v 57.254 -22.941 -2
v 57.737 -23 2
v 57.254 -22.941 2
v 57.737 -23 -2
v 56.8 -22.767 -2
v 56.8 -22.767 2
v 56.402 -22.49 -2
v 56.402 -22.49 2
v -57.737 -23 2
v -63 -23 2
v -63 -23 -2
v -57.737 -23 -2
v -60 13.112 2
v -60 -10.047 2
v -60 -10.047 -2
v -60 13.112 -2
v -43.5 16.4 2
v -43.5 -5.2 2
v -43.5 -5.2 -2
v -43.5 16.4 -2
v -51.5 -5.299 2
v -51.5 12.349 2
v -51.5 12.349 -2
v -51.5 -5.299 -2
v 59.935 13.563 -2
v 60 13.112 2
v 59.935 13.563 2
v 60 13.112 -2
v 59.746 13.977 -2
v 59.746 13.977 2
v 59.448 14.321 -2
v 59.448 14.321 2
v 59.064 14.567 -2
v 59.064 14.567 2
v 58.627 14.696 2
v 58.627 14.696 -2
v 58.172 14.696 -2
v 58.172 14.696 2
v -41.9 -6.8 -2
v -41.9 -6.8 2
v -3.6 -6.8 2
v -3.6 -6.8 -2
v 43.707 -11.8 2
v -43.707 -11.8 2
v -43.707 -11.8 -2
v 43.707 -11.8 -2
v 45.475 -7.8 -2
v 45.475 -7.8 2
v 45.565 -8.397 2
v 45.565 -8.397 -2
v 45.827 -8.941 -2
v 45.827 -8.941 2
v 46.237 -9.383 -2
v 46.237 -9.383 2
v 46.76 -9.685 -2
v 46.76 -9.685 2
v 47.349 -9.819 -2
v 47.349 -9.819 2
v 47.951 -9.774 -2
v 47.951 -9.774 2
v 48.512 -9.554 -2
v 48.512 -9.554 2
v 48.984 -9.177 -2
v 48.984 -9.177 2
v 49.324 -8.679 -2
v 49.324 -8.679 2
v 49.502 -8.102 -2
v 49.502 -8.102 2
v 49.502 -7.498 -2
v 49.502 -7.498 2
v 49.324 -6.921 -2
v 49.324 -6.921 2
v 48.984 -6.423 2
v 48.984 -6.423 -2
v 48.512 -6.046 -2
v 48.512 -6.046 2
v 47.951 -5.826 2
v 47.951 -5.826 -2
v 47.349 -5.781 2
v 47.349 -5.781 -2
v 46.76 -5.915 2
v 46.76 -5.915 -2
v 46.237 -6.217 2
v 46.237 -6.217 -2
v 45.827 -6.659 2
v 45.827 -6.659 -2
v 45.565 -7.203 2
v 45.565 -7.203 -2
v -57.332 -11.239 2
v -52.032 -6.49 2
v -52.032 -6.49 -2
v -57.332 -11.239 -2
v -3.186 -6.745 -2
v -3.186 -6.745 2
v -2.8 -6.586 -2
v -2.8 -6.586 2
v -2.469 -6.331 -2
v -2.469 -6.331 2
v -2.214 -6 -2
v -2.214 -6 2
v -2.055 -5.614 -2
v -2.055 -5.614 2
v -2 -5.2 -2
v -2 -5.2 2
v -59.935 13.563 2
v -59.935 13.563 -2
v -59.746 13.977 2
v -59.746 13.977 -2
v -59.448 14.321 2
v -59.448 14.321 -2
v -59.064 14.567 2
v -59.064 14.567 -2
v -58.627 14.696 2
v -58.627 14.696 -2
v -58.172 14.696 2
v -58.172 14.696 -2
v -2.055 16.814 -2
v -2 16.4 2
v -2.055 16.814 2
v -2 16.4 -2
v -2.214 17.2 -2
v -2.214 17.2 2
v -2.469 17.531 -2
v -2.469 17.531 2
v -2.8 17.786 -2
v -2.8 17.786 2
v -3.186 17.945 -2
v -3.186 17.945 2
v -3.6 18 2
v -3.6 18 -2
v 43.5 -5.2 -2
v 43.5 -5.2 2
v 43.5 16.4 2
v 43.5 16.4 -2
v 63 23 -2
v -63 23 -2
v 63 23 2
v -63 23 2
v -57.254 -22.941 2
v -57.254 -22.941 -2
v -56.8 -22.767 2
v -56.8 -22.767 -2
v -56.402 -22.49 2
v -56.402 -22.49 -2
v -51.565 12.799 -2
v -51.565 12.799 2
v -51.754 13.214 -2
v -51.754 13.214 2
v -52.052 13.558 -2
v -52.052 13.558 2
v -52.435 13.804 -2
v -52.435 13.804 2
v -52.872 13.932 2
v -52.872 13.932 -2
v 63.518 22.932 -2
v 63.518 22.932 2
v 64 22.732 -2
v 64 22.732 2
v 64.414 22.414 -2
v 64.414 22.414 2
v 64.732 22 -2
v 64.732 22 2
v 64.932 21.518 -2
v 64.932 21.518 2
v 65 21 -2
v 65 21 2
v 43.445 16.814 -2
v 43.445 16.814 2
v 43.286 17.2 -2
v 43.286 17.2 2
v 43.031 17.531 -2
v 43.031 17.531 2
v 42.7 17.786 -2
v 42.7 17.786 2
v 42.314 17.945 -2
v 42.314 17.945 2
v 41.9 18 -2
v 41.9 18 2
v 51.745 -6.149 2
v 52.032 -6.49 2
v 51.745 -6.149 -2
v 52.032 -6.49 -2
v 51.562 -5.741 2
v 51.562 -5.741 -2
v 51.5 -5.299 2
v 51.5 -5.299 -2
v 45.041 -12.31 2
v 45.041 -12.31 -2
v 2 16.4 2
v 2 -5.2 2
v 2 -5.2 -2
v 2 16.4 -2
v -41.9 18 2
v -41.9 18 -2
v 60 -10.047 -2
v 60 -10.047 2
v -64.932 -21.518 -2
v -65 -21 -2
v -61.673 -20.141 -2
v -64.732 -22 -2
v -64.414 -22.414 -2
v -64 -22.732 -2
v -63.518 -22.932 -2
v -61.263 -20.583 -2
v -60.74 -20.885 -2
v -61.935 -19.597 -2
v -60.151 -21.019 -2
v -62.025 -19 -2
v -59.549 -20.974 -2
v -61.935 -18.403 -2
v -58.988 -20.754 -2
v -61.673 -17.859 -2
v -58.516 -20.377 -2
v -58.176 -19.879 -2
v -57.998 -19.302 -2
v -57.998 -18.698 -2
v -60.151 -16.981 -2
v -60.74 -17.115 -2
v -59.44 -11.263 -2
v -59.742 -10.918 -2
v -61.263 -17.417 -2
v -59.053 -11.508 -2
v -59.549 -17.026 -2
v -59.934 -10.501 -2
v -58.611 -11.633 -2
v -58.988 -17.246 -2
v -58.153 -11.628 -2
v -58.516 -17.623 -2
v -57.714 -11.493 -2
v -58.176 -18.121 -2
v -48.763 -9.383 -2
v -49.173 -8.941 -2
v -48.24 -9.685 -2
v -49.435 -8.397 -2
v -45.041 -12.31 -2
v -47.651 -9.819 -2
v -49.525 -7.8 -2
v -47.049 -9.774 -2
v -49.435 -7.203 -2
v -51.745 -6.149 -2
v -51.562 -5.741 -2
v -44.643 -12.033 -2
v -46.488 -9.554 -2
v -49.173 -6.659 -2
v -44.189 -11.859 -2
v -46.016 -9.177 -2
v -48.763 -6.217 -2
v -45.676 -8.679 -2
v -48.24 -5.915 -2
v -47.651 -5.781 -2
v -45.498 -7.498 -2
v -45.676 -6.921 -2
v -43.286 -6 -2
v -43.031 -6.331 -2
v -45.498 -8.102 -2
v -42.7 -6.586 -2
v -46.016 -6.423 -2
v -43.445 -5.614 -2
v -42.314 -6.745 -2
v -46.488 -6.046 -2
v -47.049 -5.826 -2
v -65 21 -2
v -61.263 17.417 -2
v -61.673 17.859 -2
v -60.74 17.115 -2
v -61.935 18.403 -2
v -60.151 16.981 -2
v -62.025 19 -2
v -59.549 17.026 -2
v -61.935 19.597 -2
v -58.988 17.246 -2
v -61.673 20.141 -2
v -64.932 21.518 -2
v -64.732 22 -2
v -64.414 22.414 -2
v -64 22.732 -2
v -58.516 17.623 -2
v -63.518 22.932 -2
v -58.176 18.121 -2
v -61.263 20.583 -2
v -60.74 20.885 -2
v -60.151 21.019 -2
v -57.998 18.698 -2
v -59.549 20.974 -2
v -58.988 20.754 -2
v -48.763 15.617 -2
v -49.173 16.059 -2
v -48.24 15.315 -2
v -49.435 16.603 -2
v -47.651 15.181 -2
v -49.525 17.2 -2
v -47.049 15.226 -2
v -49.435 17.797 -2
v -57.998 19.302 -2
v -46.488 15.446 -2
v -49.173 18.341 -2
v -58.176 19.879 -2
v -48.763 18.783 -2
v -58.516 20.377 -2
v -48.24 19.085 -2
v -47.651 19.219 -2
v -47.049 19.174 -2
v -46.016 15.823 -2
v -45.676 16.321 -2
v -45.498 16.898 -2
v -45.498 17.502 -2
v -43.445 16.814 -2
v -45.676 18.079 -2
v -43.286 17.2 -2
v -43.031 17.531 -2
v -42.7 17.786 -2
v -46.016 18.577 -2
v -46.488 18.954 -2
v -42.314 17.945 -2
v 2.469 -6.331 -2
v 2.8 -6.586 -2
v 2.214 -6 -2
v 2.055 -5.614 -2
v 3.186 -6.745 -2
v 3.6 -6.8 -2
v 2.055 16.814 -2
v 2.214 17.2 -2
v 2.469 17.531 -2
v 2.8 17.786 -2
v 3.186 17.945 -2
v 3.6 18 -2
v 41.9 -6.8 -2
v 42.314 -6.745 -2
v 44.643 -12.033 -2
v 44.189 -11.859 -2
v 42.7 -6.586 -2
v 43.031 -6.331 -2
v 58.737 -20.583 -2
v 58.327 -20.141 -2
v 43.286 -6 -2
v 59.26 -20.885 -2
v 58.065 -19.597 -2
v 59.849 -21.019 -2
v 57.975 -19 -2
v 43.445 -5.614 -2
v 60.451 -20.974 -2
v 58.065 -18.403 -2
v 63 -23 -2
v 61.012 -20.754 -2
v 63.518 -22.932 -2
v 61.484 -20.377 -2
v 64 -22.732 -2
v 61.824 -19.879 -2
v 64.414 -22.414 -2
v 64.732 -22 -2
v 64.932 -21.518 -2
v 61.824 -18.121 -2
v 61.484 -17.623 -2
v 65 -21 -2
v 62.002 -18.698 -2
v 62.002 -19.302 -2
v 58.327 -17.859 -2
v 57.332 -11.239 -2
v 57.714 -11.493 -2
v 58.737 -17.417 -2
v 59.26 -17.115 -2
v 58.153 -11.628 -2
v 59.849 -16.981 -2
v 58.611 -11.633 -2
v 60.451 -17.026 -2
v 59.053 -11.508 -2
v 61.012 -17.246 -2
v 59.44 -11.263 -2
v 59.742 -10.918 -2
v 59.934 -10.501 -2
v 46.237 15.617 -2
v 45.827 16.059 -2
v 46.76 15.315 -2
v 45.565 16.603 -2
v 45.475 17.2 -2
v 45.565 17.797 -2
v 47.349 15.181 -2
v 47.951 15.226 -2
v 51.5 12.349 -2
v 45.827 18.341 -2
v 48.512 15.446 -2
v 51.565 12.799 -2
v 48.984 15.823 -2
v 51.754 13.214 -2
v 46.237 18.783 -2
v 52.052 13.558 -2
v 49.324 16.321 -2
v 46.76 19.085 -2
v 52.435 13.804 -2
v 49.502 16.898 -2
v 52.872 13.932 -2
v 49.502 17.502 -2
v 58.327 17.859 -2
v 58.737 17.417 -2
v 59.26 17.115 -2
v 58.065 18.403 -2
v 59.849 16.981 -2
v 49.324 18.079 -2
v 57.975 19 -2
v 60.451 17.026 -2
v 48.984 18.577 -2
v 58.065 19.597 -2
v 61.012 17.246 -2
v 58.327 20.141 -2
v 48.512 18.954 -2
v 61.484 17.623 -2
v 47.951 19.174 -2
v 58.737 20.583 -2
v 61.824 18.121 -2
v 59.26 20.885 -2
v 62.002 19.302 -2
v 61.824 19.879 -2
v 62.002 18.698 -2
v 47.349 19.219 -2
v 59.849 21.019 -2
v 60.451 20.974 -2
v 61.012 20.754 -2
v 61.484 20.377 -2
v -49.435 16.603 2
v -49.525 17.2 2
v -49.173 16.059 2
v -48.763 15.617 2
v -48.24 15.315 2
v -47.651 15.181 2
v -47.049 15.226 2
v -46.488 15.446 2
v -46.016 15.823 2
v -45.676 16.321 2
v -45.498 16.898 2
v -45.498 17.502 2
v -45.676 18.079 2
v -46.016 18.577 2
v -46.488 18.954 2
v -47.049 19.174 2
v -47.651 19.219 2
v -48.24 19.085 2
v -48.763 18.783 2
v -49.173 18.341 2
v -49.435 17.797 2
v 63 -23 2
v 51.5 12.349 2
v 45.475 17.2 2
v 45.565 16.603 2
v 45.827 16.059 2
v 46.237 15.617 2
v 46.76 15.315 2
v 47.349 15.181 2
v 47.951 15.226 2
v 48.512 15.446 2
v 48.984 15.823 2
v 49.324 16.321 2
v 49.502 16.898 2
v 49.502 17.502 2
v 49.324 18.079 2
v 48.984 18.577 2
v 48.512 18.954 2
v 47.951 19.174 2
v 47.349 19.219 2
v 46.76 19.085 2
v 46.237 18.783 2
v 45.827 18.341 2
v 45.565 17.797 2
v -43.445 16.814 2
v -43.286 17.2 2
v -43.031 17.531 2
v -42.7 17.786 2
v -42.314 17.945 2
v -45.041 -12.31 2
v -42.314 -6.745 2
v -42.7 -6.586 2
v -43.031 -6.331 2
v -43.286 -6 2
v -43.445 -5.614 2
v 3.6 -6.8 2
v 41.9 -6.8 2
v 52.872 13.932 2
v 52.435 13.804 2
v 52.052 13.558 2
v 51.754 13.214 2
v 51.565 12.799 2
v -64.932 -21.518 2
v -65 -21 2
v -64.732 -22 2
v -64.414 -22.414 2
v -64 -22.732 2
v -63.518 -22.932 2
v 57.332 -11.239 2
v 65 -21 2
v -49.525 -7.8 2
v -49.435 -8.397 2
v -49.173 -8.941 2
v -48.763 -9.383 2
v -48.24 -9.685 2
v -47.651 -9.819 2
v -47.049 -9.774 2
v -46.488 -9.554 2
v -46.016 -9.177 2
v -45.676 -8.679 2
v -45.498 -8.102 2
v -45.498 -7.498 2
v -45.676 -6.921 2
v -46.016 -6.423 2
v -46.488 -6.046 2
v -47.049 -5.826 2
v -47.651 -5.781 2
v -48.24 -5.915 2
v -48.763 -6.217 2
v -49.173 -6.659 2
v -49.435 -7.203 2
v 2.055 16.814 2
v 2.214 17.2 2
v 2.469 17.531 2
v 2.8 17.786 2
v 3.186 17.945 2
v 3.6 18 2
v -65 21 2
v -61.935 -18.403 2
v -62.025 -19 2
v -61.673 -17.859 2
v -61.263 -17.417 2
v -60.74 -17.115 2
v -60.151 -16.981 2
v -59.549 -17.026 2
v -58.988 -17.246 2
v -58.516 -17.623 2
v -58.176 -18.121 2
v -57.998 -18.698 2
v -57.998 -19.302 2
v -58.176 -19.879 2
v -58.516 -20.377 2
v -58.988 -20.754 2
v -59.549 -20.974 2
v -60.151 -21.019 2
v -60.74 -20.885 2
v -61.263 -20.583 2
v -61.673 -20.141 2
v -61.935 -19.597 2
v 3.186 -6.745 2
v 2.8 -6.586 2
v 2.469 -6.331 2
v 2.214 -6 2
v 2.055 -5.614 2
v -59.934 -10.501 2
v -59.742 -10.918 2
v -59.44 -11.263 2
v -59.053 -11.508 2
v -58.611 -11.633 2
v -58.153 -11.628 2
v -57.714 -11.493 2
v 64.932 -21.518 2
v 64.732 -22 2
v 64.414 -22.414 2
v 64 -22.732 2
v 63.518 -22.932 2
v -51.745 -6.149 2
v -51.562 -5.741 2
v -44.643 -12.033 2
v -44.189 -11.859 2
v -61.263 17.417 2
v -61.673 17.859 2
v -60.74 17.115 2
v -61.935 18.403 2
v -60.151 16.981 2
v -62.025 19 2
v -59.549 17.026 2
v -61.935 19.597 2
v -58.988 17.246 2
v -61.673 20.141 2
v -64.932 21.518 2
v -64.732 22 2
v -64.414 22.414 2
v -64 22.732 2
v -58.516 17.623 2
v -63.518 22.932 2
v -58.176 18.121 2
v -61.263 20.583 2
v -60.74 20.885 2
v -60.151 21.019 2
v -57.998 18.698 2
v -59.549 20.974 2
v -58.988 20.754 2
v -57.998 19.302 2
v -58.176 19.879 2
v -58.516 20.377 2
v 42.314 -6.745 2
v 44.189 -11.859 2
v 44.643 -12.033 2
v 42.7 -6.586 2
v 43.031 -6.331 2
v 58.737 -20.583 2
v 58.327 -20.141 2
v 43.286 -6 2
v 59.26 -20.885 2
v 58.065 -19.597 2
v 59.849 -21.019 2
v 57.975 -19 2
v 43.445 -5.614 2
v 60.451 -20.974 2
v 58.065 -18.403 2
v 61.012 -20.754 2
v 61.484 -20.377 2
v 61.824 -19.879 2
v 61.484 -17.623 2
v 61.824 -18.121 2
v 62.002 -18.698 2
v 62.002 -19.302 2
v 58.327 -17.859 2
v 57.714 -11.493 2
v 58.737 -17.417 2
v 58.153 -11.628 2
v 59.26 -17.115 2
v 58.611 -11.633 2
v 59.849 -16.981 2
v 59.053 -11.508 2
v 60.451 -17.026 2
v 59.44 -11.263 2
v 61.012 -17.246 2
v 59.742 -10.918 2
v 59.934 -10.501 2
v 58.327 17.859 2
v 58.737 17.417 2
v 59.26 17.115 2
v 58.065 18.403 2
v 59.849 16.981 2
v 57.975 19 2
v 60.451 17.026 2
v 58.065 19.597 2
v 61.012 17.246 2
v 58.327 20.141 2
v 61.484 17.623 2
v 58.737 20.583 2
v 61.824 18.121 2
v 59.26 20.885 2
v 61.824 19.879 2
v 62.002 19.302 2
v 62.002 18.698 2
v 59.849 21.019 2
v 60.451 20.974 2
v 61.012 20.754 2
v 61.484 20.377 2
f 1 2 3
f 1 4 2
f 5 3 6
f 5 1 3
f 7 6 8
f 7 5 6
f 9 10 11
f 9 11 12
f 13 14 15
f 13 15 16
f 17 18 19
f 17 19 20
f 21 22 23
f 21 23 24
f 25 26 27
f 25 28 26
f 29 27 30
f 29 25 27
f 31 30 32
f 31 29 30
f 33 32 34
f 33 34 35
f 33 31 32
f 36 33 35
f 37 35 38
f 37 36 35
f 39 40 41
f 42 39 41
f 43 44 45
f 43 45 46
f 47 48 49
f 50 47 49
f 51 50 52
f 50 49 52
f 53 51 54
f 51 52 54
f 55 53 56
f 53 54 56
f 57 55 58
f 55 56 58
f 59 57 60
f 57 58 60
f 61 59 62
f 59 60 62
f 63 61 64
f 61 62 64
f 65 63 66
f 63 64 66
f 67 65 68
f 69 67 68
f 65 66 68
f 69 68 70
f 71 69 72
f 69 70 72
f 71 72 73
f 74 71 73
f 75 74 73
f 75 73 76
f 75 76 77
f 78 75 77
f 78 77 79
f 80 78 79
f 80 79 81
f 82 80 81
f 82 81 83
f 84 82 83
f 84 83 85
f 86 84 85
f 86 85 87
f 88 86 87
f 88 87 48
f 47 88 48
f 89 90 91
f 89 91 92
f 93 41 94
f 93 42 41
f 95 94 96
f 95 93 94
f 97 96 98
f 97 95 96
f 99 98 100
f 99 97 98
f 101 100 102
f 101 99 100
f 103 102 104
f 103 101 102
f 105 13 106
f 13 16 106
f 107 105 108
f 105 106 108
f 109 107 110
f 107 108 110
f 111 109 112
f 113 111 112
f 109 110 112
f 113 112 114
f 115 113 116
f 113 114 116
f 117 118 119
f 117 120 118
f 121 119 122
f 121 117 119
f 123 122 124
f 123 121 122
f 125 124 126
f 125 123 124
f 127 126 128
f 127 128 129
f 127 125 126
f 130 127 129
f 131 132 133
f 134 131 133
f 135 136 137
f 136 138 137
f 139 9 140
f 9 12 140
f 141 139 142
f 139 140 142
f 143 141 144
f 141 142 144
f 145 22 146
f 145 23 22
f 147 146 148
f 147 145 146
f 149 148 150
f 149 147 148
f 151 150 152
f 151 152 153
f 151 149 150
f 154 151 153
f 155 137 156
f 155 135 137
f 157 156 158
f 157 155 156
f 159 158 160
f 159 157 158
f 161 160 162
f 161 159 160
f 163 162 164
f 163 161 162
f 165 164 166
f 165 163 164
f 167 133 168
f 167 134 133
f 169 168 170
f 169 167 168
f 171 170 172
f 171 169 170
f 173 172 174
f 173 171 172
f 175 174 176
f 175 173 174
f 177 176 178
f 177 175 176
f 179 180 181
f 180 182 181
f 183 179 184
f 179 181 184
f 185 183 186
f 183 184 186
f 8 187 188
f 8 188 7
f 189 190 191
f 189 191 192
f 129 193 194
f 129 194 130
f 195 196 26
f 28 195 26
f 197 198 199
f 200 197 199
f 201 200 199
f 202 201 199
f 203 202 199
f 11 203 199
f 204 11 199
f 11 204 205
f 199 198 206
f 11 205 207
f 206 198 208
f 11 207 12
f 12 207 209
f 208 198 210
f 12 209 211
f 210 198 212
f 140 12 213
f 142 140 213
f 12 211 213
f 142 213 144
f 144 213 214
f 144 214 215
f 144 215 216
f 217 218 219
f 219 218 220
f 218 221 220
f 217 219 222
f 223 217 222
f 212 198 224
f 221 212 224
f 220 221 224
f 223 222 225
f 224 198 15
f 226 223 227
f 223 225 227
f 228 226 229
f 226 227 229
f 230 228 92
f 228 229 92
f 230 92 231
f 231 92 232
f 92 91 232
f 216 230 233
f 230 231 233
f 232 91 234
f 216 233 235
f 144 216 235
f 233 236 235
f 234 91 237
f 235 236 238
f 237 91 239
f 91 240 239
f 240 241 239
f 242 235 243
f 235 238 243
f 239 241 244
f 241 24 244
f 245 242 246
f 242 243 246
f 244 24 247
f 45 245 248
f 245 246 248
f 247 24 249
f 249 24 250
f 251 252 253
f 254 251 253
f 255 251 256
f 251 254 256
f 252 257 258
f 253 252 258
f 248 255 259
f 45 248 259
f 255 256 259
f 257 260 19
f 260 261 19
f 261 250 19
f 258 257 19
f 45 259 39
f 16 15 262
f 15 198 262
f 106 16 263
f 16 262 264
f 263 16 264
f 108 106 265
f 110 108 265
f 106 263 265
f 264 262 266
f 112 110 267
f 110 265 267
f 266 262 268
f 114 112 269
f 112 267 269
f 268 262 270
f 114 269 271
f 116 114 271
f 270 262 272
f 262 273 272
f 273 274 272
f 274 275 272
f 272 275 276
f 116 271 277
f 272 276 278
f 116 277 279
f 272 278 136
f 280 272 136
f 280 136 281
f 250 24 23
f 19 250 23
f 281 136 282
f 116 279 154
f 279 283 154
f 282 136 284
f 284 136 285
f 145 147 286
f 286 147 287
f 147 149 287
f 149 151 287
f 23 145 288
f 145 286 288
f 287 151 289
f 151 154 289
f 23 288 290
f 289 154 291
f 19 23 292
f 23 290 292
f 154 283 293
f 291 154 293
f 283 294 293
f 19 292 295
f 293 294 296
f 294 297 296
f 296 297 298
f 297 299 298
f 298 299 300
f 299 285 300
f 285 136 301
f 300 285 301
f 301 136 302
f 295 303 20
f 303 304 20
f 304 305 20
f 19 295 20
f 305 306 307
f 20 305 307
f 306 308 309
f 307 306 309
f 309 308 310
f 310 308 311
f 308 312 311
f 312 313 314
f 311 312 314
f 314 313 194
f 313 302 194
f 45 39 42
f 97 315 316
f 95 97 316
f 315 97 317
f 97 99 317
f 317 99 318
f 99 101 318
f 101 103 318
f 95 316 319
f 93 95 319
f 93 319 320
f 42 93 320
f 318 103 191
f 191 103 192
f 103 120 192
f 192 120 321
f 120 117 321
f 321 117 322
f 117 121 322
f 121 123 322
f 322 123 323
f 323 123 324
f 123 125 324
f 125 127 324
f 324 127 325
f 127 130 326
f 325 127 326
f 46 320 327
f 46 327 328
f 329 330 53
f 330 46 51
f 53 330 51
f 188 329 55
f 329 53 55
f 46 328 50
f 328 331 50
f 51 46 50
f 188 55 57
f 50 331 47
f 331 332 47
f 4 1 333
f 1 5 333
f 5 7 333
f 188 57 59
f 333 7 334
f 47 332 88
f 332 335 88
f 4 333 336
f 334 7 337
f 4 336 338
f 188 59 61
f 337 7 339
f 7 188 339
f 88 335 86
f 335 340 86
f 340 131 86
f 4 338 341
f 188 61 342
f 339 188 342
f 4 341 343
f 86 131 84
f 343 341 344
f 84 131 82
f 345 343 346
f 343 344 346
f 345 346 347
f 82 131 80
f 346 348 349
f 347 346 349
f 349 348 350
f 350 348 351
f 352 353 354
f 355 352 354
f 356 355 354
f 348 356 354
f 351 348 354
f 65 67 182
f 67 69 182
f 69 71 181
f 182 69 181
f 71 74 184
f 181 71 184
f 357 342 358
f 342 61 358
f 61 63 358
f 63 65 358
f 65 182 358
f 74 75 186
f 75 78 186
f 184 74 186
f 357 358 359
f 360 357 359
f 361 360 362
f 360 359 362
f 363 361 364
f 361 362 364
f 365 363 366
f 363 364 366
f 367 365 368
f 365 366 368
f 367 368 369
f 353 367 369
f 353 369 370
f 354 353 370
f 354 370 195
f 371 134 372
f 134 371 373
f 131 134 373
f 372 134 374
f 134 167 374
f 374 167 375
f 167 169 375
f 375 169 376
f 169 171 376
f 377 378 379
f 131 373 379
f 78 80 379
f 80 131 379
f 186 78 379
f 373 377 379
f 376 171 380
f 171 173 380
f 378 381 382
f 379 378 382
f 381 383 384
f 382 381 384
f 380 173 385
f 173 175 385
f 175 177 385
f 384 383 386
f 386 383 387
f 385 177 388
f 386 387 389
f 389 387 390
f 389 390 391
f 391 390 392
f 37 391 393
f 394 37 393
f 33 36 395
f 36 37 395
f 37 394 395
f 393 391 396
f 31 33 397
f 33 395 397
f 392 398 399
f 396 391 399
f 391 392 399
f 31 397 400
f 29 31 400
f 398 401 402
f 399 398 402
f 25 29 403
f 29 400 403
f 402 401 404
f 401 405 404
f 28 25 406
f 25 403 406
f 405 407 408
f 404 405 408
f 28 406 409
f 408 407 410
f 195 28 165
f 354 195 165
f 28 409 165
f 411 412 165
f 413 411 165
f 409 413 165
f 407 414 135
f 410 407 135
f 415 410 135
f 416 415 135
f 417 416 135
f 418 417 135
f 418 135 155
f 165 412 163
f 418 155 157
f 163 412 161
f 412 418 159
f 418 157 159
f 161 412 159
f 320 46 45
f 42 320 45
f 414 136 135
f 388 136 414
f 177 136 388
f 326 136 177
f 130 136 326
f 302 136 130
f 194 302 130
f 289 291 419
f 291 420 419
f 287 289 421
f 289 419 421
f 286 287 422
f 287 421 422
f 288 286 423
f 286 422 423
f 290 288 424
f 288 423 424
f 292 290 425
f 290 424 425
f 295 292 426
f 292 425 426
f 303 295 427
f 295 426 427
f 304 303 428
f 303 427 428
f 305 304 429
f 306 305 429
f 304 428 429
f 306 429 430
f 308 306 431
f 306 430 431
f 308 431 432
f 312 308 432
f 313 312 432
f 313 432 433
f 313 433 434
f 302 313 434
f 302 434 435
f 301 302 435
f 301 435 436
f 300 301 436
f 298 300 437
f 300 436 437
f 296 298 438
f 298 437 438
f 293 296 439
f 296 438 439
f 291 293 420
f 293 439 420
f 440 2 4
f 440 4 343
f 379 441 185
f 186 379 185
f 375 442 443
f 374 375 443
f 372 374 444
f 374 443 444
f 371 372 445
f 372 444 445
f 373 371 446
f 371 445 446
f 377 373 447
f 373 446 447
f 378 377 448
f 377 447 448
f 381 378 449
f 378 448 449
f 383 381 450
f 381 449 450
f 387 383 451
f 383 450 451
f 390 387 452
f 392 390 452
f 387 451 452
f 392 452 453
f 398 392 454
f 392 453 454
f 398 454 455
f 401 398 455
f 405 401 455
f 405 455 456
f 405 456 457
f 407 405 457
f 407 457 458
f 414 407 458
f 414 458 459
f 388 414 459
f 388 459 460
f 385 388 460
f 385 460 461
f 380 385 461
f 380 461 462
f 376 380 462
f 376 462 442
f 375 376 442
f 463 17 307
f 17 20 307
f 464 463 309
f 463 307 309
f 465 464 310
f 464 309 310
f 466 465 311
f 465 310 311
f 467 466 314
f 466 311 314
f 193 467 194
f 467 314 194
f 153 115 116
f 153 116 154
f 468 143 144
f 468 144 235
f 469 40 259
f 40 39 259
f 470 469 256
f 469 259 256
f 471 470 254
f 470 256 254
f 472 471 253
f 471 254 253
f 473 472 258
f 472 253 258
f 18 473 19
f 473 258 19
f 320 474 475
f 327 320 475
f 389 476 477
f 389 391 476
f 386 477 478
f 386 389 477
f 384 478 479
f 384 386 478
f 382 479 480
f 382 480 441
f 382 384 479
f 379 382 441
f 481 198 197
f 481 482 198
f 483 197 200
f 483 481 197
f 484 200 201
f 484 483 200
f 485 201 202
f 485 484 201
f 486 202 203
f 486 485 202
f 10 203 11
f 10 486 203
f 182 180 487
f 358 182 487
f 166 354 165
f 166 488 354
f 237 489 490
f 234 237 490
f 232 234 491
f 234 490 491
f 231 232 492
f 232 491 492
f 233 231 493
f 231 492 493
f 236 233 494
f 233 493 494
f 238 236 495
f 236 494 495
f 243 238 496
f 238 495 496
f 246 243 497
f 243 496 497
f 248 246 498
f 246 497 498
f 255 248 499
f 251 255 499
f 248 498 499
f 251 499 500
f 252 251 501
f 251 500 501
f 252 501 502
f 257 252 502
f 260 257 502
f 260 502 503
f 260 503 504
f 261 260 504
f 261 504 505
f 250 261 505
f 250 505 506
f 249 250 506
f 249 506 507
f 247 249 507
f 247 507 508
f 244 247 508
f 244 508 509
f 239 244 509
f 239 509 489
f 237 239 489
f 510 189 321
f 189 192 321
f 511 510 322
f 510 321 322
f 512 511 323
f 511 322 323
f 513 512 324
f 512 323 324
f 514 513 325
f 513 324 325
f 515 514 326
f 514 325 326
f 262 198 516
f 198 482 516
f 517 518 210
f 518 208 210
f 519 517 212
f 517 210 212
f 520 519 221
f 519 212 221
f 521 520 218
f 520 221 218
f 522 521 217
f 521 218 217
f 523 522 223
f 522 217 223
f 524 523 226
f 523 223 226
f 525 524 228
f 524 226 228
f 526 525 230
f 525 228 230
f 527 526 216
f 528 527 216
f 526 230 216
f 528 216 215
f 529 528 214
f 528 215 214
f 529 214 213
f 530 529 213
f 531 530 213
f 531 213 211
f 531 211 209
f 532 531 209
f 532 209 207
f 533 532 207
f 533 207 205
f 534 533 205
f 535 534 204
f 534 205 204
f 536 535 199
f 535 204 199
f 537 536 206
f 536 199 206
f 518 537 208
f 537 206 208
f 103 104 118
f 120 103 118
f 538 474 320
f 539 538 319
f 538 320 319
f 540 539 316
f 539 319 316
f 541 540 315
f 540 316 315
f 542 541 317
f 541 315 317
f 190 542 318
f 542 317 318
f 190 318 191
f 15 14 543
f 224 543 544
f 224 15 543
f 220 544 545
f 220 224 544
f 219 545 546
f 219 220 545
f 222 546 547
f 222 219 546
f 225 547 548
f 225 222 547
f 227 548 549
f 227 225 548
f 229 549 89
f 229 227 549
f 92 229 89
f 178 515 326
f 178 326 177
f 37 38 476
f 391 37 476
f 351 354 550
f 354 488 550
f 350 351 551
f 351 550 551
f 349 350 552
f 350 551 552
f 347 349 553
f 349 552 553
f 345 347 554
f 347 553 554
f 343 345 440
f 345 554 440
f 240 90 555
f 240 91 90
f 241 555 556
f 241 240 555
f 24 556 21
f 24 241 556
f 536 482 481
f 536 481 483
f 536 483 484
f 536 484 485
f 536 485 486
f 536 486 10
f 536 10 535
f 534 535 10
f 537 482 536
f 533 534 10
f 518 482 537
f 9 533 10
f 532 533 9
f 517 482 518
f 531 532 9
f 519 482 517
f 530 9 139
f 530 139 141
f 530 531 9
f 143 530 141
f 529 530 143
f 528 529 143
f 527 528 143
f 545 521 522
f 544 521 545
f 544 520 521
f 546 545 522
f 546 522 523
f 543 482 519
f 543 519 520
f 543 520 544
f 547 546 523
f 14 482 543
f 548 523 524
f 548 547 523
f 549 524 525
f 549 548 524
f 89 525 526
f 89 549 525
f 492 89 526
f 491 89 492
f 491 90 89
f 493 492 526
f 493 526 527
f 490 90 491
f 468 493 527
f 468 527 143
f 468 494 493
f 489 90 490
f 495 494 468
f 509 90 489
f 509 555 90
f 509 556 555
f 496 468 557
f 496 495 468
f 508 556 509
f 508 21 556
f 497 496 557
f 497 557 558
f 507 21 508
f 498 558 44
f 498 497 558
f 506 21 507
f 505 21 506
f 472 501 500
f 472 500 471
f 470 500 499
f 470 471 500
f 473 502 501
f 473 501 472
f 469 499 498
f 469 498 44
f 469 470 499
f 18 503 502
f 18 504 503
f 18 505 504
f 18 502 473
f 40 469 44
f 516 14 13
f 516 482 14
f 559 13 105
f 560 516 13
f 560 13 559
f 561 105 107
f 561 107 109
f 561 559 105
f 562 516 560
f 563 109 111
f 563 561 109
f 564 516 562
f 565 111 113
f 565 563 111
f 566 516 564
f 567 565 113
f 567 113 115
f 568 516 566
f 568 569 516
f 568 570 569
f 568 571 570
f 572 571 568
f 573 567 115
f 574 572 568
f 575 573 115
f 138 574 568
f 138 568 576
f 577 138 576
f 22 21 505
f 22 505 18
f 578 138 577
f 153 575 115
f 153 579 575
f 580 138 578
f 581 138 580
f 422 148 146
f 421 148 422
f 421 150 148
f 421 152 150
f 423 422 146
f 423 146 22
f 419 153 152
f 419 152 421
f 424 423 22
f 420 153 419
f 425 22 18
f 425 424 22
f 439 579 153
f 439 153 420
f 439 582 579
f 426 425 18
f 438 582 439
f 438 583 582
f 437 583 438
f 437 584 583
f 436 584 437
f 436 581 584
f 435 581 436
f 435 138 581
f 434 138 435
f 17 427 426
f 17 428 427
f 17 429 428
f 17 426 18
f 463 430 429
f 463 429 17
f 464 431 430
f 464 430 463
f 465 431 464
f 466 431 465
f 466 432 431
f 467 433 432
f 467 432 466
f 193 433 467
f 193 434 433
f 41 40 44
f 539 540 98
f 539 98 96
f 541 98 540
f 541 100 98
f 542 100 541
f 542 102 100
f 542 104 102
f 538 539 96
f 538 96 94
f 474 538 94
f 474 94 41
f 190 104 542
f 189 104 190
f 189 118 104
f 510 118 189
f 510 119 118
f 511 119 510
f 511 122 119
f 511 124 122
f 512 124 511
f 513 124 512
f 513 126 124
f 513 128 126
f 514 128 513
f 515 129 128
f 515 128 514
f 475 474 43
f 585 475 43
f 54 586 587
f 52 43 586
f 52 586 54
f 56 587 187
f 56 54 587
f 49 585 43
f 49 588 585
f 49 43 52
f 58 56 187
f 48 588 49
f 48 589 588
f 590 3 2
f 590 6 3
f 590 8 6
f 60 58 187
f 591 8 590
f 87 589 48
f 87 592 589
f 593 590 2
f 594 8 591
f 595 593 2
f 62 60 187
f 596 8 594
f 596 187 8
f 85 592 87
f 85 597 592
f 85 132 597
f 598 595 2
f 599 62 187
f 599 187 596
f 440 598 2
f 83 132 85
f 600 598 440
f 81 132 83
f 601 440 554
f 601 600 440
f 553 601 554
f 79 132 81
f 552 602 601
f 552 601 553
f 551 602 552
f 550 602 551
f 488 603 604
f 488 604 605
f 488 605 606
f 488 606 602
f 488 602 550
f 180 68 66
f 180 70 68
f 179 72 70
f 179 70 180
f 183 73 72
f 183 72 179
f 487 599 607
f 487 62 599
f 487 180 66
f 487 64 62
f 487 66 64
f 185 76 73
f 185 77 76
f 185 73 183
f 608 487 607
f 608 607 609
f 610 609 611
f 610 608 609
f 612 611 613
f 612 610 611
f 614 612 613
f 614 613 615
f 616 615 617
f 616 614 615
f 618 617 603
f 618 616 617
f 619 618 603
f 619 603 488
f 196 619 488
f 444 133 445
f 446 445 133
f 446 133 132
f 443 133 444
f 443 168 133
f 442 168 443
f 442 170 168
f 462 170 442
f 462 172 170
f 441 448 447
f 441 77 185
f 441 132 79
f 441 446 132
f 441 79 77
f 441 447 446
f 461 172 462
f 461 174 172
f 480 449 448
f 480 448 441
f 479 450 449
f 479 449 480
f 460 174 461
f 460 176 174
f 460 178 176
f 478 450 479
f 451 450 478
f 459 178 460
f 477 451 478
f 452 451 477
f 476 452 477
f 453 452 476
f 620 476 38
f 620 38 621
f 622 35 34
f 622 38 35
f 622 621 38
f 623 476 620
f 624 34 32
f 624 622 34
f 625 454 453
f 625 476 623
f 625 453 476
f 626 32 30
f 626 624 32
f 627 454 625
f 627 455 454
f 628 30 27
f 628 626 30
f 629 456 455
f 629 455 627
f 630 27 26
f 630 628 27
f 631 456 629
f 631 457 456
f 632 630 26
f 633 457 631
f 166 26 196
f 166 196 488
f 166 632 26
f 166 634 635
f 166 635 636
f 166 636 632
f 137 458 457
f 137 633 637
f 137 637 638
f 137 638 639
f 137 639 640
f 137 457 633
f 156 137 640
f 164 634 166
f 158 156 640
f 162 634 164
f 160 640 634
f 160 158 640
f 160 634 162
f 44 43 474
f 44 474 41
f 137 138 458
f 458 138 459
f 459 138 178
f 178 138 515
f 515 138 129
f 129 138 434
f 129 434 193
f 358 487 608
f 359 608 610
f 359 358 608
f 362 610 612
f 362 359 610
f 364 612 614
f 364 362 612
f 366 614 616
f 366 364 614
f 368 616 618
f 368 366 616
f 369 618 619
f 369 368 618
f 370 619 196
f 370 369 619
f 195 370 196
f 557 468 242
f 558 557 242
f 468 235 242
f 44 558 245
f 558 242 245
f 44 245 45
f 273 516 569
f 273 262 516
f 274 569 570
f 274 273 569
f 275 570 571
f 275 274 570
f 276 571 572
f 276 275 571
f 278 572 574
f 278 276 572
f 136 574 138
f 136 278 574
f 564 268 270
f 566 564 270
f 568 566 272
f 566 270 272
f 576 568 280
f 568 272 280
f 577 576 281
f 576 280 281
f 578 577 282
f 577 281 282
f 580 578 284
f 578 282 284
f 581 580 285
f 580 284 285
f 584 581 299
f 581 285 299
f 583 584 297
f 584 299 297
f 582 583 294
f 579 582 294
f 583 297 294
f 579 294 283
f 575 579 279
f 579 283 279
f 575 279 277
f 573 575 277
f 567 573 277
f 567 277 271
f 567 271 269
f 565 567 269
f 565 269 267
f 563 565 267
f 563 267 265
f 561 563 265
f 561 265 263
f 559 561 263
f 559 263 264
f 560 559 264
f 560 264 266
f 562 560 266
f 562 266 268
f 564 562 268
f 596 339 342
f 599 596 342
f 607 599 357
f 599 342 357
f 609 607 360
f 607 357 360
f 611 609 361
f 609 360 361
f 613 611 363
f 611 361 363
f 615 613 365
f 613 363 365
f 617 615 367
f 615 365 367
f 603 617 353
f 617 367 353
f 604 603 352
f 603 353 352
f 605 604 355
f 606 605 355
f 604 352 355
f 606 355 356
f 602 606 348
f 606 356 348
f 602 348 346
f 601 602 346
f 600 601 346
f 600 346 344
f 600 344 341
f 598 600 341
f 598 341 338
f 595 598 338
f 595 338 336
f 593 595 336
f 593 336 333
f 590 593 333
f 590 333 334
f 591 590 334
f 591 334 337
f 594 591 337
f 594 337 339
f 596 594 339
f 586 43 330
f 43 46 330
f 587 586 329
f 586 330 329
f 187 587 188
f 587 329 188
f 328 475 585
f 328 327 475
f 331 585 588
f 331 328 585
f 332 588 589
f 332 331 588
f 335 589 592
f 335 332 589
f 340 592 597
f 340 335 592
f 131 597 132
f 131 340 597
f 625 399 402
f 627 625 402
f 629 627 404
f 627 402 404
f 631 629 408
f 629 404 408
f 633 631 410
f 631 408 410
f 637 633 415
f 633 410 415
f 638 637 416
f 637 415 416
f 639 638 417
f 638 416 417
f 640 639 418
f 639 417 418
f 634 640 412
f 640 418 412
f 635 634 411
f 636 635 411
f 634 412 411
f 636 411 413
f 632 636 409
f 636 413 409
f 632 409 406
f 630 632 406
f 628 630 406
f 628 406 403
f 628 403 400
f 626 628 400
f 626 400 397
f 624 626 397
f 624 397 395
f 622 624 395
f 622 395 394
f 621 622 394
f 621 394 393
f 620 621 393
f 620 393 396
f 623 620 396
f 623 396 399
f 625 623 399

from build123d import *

# Parameters (mm, degrees)
SKETCH_1_W          = 130
SKETCH_1_H          = 46
EXTRUDE_1_DEPTH     = 2
SKETCH_3_R          = 2.025
CUT_EXTRUDE_1_DEPTH = 80
SKETCH_4_R          = 2.025
CUT_EXTRUDE_2_DEPTH = 80
CUT_EXTRUDE_3_DEPTH = 10
SKETCH_6_W          = 41.5
SKETCH_6_H          = 24.8
CUT_EXTRUDE_4_DEPTH = 10
CUT_EXTRUDE_5_DEPTH = 10
FILLET_1_R          = 1.6
FILLET_2_R          = 2


with BuildPart() as part:
    # 草图1 → 凸台-拉伸1 (new, symmetric)
    with BuildSketch(Plane.XY):
        Rectangle(SKETCH_1_W, SKETCH_1_H)
    extrude(amount=EXTRUDE_1_DEPTH, both=True)

    # 草图3 → 切除-拉伸1 (cut, symmetric)
    with BuildSketch(Plane(origin=(0, 0, -2), x_dir=(-1, 0, 0), z_dir=(0, 0, -1))):
        with Locations((-60, 19)):
            Circle(SKETCH_3_R)
        with Locations((-60, -19)):
            Circle(SKETCH_3_R)
        with Locations((60, 19)):
            Circle(SKETCH_3_R)
        with Locations((60, -19)):
            Circle(SKETCH_3_R)
    extrude(amount=CUT_EXTRUDE_1_DEPTH, both=True, mode=Mode.SUBTRACT)

    # 草图4 → 切除-拉伸2 (cut, symmetric)
    with BuildSketch(Plane.XY.offset(2)):
        with Locations(Location((47.5, 17.2, 0), (0, 0, 180))):
            Circle(SKETCH_4_R)
        with Locations(Location((47.5, -7.8, 0), (0, 0, 180))):
            Circle(SKETCH_4_R)
        with Locations(Location((-47.5, -7.8, 0), (0, 0, 180))):
            Circle(SKETCH_4_R)
        with Locations(Location((-47.5, 17.2, 0), (0, 0, 180))):
            Circle(SKETCH_4_R)
    extrude(amount=CUT_EXTRUDE_2_DEPTH, both=True, mode=Mode.SUBTRACT)

    # 草图5 → 切除-拉伸3 (cut)
    with BuildSketch(Plane.XY.offset(2)):
        Polygon((-56.971596888, -23), (-44.471596888, -11.8), (44.471596888, -11.8), (56.971596888, -23), align=None)
    extrude(amount=-CUT_EXTRUDE_3_DEPTH, mode=Mode.SUBTRACT)

    # 草图6 → 切除-拉伸4 (cut)
    with BuildSketch(Plane.XY.offset(2)):
        with Locations((-22.75, 5.6)):
            Rectangle(SKETCH_6_W, SKETCH_6_H)
        with Locations((22.75, 5.6)):
            Rectangle(SKETCH_6_W, SKETCH_6_H)
    extrude(amount=-CUT_EXTRUDE_4_DEPTH, mode=Mode.SUBTRACT)

    # 草图7 → 切除-拉伸5 (cut)
    with BuildSketch(Plane.XY.offset(2)):
        Polygon((-60, 14.95874079), (-51.5, 13.73474079), (-51.5, -6.01324065), (-60, -13.62924065), align=None)
        Polygon((51.5, -6.01324065), (60, -13.62924065), (60, 14.95874079), (51.5, 13.73474079), align=None)
    extrude(amount=-CUT_EXTRUDE_5_DEPTH, mode=Mode.SUBTRACT)

    # 圆角1
    fillet_1_edges = [part.edges().sort_by_distance(p)[0] for p in [
        (-2, 18, 0),
        (-2, -6.8, 0),
        (-43.5, -6.8, 0),
        (-43.5, 18, 0),
        (2, 18, 0),
        (43.5, 18, 0),
        (43.5, -6.8, 0),
        (2, -6.8, 0),
        (-60, -13.62924065, 0),
        (-60, 14.95874079, 0),
        (-51.5, 13.73474079, 0),
        (-51.5, -6.01324065, 0),
        (51.5, -6.01324065, 0),
        (51.5, 13.73474079, 0),
        (60, 14.95874079, 0),
        (60, -13.62924065, 0),
    ]]
    fillet(fillet_1_edges, radius=FILLET_1_R)

    # 圆角2
    fillet_2_edges = [part.edges().sort_by_distance(p)[0] for p in [
        (56.971596888, -23, 0),
        (-56.971596888, -23, 0),
        (-44.471596888, -11.8, 0),
        (44.471596888, -11.8, 0),
        (65, -23, 0),
        (-65, -23, 0),
        (-65, 23, 0),
        (65, 23, 0),
    ]]
    fillet(fillet_2_edges, radius=FILLET_2_R)


solid = part.part
